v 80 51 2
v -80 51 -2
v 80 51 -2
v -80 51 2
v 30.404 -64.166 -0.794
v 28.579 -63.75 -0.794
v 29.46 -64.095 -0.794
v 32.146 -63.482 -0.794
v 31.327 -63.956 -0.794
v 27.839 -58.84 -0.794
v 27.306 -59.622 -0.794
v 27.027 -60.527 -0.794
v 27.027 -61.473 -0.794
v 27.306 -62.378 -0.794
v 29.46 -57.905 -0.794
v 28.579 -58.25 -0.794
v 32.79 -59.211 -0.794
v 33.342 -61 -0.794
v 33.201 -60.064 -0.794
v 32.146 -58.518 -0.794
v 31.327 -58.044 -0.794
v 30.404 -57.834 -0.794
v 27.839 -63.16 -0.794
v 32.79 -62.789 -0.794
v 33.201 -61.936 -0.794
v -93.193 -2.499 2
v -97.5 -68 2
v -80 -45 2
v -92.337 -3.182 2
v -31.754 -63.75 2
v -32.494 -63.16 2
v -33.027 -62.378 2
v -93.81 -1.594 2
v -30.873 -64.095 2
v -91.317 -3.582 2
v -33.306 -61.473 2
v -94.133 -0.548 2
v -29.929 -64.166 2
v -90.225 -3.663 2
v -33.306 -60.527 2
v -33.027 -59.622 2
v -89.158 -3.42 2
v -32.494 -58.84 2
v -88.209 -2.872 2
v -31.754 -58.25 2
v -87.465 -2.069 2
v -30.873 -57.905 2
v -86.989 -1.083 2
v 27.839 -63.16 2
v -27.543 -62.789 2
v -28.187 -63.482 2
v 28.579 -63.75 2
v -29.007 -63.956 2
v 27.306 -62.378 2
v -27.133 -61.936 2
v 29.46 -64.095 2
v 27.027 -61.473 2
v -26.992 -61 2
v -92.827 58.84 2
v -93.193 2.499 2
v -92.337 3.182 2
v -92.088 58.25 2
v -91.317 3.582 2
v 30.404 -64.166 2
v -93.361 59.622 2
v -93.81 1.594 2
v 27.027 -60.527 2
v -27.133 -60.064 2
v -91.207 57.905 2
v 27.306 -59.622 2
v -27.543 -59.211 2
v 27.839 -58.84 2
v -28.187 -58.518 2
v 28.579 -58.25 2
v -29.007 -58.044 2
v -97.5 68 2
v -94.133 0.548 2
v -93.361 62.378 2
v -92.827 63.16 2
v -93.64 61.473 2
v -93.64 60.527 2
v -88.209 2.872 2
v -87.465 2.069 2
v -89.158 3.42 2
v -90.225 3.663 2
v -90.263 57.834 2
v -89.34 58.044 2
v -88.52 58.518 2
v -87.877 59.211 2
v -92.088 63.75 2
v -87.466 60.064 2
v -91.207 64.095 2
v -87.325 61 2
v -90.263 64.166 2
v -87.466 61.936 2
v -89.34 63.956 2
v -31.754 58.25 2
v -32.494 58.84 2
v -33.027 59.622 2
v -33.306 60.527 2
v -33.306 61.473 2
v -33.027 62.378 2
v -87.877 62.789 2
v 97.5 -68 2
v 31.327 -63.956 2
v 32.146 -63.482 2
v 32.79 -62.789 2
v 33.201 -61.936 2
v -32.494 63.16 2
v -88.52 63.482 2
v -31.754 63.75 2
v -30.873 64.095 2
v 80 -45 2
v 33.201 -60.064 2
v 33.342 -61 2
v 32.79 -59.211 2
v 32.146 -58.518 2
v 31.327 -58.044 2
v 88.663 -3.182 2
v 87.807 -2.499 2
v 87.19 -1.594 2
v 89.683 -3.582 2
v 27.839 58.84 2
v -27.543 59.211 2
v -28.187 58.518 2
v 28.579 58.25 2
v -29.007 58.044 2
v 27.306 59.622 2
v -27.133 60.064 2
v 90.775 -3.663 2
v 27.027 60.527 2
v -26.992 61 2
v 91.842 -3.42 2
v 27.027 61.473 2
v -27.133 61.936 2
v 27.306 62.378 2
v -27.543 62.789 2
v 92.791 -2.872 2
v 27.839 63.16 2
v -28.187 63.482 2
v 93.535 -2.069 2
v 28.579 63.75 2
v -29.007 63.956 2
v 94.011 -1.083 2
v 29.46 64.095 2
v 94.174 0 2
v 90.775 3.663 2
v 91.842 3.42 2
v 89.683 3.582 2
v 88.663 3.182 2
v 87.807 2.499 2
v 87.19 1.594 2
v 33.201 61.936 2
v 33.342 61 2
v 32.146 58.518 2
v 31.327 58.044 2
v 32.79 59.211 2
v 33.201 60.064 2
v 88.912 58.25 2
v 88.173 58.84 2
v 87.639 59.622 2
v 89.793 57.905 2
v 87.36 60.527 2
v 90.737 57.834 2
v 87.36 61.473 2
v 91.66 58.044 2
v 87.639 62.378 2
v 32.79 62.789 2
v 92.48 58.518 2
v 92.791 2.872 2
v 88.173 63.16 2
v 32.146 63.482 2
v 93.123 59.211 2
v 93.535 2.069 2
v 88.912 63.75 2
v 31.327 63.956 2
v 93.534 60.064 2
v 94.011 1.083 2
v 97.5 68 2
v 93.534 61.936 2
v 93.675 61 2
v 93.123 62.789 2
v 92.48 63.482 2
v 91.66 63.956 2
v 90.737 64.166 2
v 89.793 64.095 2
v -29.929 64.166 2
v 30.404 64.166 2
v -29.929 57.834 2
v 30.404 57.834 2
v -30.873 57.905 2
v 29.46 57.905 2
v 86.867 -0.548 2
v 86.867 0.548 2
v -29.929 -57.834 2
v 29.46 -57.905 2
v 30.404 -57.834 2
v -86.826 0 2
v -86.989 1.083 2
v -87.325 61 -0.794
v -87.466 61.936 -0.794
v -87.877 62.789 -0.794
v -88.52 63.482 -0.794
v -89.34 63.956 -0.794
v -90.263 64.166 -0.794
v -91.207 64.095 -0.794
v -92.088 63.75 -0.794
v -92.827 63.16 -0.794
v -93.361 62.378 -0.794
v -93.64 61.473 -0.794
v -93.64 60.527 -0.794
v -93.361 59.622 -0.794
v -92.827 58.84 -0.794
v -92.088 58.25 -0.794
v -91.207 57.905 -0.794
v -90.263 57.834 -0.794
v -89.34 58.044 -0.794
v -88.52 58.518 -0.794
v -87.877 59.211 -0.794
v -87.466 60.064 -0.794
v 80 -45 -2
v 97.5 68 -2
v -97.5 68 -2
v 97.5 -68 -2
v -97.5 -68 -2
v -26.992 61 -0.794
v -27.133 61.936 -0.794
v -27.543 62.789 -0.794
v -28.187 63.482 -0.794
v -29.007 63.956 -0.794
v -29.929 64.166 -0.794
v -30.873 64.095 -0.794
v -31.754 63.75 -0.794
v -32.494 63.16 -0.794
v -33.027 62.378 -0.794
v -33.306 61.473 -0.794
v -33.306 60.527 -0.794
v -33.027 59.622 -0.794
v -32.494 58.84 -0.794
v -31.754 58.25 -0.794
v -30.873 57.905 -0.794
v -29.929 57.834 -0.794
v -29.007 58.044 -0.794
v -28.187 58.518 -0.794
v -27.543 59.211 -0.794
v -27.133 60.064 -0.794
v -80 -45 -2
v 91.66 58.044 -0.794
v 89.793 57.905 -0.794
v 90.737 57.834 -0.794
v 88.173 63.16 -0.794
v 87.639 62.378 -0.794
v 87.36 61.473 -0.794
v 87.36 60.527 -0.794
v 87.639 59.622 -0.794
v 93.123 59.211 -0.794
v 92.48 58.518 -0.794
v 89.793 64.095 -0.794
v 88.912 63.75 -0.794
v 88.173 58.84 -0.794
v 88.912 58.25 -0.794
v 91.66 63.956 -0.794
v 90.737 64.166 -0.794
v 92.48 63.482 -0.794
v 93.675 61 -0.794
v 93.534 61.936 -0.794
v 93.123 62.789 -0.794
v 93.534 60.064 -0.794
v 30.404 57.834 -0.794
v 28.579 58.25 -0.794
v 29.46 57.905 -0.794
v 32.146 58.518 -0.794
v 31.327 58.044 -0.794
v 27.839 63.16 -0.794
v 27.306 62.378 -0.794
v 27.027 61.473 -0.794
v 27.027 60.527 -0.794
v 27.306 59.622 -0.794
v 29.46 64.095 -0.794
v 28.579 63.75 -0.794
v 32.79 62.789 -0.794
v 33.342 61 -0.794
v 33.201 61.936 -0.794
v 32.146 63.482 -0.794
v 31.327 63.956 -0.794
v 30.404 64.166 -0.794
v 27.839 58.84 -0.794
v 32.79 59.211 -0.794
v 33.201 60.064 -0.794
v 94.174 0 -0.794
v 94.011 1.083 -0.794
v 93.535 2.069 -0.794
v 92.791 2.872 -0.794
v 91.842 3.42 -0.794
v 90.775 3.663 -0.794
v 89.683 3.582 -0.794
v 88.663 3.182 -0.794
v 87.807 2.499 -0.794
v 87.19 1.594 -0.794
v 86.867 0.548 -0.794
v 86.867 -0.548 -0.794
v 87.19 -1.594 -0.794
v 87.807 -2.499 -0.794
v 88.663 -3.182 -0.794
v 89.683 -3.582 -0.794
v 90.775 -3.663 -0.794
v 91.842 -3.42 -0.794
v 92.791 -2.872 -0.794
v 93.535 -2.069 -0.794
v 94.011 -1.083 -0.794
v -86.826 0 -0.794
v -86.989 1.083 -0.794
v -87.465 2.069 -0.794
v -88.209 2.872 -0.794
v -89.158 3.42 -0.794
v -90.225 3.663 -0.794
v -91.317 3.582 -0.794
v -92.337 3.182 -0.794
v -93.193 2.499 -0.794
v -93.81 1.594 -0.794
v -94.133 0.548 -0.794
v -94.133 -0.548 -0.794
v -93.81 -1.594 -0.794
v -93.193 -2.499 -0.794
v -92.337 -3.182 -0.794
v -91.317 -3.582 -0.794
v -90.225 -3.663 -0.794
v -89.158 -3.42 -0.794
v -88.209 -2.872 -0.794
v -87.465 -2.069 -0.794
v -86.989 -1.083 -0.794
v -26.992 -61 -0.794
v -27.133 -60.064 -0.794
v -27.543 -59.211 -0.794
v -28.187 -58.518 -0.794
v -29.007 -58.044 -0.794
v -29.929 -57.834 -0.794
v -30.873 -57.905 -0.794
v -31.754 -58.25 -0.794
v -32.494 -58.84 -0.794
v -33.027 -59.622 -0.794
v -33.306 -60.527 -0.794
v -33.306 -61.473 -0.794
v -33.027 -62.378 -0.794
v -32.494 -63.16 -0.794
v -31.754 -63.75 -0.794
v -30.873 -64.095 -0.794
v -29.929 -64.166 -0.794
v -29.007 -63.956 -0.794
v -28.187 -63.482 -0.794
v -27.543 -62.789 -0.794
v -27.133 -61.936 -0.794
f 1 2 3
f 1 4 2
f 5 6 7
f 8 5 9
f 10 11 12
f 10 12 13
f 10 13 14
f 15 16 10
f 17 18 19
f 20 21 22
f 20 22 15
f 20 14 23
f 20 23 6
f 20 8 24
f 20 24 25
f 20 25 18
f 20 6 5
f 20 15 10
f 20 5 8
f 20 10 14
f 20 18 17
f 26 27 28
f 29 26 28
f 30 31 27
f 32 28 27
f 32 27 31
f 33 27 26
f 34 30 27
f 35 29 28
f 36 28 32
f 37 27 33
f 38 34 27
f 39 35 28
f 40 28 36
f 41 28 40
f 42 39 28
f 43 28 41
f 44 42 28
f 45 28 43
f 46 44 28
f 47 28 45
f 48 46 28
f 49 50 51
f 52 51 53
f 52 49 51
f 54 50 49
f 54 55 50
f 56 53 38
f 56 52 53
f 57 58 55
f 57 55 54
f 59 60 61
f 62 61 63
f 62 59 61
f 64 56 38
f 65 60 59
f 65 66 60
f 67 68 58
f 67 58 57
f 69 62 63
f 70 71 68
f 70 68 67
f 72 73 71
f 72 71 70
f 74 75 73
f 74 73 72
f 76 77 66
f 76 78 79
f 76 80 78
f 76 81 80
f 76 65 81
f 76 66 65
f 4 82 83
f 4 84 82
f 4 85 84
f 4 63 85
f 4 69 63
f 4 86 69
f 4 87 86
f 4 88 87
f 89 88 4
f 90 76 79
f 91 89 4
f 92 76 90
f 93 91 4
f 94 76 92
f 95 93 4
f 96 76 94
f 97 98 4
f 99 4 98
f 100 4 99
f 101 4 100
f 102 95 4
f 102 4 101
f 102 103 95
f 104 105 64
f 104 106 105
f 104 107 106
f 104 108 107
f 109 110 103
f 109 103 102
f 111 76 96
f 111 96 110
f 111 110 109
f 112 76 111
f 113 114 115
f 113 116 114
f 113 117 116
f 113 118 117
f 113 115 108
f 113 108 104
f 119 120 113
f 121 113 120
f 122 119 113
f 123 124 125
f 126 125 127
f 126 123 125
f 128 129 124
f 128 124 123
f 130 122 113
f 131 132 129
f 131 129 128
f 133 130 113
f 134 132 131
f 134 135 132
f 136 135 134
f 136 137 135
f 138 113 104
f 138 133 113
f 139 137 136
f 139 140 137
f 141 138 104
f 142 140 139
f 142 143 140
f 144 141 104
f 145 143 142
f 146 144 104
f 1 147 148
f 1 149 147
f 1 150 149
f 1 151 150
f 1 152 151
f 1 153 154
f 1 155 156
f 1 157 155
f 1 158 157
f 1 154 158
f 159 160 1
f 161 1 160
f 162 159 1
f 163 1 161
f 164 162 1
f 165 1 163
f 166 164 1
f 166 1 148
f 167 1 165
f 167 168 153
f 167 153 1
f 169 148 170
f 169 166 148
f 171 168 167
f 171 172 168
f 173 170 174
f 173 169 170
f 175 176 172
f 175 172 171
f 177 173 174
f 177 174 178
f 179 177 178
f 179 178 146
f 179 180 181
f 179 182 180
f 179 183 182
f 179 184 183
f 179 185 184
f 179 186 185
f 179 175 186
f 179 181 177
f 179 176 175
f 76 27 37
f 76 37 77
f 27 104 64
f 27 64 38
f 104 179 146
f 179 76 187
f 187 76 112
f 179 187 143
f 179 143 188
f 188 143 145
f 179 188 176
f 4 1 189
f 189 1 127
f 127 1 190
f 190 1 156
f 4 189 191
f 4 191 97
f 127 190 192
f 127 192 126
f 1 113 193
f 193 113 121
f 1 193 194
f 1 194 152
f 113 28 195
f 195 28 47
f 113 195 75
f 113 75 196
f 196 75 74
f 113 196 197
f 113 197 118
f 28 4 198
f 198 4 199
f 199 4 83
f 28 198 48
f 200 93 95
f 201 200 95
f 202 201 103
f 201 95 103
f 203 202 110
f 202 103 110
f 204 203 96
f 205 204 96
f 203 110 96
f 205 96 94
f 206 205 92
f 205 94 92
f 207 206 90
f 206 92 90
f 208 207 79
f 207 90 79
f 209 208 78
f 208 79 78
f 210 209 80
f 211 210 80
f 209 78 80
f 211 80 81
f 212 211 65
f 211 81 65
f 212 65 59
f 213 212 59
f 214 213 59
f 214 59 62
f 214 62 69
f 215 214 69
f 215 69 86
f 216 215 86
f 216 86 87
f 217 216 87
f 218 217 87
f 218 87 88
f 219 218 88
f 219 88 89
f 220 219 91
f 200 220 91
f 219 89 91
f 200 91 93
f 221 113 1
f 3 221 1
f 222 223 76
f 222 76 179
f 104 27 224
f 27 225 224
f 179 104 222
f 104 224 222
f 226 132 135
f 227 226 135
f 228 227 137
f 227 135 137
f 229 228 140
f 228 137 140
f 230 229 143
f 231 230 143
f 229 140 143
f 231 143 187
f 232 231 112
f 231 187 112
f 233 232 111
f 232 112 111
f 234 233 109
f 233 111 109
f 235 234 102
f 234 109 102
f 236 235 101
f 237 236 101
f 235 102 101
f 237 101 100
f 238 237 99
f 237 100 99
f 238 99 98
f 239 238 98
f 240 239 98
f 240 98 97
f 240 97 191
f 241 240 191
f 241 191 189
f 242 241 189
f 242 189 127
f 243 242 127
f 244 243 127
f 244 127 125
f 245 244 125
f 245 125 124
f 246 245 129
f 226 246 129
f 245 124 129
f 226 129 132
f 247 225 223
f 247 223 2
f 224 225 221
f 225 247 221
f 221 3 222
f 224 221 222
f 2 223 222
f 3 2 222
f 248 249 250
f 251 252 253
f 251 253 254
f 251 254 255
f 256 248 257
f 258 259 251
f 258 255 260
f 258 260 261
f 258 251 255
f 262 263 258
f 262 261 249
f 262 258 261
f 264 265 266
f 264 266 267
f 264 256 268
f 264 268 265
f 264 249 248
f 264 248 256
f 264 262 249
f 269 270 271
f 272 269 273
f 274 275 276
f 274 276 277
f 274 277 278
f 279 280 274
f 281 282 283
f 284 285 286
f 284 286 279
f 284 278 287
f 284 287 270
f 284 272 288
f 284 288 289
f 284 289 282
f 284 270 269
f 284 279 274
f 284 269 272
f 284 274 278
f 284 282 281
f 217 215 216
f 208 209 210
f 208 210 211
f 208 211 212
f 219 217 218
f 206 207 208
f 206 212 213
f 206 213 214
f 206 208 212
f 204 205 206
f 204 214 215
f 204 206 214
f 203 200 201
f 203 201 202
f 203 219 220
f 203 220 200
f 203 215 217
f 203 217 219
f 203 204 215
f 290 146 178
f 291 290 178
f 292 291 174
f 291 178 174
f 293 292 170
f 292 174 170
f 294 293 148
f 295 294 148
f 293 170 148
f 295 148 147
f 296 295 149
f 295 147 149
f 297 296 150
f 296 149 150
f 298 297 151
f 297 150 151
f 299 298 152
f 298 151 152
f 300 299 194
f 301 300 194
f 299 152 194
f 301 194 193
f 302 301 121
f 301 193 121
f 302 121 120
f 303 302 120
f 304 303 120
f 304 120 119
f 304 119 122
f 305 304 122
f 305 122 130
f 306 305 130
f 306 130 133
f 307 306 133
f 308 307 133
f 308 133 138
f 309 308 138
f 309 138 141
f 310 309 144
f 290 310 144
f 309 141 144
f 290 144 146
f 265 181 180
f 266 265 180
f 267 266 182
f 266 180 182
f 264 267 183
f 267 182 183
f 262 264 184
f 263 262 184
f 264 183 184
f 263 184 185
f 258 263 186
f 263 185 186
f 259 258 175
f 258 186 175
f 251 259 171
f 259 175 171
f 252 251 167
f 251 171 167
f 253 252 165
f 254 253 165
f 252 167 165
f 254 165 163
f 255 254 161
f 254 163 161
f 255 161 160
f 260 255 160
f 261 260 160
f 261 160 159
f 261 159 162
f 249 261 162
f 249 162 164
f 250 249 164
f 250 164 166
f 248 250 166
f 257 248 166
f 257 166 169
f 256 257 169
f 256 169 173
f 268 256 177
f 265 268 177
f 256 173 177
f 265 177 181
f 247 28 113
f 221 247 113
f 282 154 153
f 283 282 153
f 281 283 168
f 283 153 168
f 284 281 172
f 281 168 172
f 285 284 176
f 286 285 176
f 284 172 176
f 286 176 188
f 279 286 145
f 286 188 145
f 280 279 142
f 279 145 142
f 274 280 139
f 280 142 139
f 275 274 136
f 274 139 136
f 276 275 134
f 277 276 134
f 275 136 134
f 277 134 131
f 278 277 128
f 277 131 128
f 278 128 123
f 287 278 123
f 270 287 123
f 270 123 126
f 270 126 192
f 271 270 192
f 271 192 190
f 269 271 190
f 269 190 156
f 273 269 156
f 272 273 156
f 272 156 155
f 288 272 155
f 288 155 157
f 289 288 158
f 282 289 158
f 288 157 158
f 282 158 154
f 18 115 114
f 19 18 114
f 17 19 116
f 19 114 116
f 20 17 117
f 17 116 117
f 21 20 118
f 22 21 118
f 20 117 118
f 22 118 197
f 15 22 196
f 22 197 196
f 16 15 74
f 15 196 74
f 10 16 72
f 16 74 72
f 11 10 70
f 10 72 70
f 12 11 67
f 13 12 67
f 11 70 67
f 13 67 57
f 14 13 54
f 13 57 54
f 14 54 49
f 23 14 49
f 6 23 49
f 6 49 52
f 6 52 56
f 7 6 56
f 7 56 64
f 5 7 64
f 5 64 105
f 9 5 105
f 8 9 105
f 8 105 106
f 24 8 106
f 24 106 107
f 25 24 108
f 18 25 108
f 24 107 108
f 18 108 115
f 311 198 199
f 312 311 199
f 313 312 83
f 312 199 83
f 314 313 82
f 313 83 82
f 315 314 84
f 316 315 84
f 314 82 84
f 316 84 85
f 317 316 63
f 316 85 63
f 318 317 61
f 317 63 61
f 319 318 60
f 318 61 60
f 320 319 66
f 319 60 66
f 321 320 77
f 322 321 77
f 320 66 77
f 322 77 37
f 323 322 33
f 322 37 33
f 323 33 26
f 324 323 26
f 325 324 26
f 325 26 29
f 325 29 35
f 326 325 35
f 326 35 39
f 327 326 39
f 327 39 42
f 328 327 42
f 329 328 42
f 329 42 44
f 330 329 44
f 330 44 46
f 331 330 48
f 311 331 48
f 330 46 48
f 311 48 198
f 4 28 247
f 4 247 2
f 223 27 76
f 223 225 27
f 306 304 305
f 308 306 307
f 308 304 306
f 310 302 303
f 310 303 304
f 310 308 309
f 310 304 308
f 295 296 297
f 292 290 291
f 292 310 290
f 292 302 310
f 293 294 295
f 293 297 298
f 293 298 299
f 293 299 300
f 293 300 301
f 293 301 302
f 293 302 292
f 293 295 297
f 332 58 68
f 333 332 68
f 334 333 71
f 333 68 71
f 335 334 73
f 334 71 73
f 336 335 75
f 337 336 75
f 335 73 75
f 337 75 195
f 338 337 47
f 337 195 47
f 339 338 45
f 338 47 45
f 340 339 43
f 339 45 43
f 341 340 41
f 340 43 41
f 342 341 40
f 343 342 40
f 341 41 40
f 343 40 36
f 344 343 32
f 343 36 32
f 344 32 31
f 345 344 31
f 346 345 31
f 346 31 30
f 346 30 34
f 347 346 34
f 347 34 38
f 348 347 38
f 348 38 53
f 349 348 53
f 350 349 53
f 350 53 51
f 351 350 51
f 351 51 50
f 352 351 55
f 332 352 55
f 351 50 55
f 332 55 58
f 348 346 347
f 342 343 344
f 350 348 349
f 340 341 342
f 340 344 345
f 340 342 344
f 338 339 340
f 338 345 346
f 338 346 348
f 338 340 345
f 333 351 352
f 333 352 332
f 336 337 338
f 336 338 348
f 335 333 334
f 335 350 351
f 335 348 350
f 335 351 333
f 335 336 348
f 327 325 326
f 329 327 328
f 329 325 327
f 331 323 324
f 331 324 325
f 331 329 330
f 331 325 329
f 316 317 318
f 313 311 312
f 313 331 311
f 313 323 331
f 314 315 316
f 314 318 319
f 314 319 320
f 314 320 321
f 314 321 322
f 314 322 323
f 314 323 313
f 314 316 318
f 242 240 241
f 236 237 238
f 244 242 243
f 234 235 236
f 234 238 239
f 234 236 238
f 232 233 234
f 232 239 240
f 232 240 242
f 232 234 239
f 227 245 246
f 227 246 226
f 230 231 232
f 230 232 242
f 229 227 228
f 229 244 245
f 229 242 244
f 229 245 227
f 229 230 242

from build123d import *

# Parameters (mm, degrees)
SKETCH1_W           = 195
SKETCH1_H           = 136
SKETCH1_W_2         = 160
SKETCH1_H_2         = 96
BOSS_EXTRUDE1_DEPTH = 2
SKETCH1_3_W         = 195
SKETCH1_3_H         = 136
SKETCH1_3_W_2       = 160
SKETCH1_3_H_2       = 96
BOSS_EXTRUDE2_DEPTH = 2
SKETCH2_R           = 3.175
SKETCH2_R_2         = 3.673722566
CUT_EXTRUDE1_DEPTH  = 2.794


with BuildPart() as part:
    # Sketch1 → Boss-Extrude1 (new body)
    with BuildSketch(Plane.XY):
        Rectangle(SKETCH1_W, SKETCH1_H)
        with Locations((0, 3)):
            Rectangle(SKETCH1_W_2, SKETCH1_H_2, mode=Mode.SUBTRACT)
    extrude(amount=-BOSS_EXTRUDE1_DEPTH)

    # Sketch1<3> → Boss-Extrude2 (add)
    with BuildSketch(Plane.XY):
        Rectangle(SKETCH1_3_W, SKETCH1_3_H)
        with Locations((0, 3)):
            Rectangle(SKETCH1_3_W_2, SKETCH1_3_H_2, mode=Mode.SUBTRACT)
    extrude(amount=BOSS_EXTRUDE2_DEPTH)

    # Sketch2 → Cut-Extrude1 (cut)
    with BuildSketch(Plane.XY.offset(2)):
        with Locations((-90.5, 61)):
            Circle(SKETCH2_R)
        with Locations((90.5, 61)):
            Circle(SKETCH2_R)
        with Locations((-30.166666667, -61)):
            Circle(SKETCH2_R)
        with Locations((30.166666667, -61)):
            Circle(SKETCH2_R)
        with Locations((90.5, 0)):
            Circle(SKETCH2_R_2)
        with Locations((-30.166666667, 61)):
            Circle(SKETCH2_R)
        with Locations((30.166666667, 61)):
            Circle(SKETCH2_R)
        with Locations((-90.5, 0)):
            Circle(SKETCH2_R_2)
    extrude(amount=-CUT_EXTRUDE1_DEPTH, mode=Mode.SUBTRACT)


solid = part.part
